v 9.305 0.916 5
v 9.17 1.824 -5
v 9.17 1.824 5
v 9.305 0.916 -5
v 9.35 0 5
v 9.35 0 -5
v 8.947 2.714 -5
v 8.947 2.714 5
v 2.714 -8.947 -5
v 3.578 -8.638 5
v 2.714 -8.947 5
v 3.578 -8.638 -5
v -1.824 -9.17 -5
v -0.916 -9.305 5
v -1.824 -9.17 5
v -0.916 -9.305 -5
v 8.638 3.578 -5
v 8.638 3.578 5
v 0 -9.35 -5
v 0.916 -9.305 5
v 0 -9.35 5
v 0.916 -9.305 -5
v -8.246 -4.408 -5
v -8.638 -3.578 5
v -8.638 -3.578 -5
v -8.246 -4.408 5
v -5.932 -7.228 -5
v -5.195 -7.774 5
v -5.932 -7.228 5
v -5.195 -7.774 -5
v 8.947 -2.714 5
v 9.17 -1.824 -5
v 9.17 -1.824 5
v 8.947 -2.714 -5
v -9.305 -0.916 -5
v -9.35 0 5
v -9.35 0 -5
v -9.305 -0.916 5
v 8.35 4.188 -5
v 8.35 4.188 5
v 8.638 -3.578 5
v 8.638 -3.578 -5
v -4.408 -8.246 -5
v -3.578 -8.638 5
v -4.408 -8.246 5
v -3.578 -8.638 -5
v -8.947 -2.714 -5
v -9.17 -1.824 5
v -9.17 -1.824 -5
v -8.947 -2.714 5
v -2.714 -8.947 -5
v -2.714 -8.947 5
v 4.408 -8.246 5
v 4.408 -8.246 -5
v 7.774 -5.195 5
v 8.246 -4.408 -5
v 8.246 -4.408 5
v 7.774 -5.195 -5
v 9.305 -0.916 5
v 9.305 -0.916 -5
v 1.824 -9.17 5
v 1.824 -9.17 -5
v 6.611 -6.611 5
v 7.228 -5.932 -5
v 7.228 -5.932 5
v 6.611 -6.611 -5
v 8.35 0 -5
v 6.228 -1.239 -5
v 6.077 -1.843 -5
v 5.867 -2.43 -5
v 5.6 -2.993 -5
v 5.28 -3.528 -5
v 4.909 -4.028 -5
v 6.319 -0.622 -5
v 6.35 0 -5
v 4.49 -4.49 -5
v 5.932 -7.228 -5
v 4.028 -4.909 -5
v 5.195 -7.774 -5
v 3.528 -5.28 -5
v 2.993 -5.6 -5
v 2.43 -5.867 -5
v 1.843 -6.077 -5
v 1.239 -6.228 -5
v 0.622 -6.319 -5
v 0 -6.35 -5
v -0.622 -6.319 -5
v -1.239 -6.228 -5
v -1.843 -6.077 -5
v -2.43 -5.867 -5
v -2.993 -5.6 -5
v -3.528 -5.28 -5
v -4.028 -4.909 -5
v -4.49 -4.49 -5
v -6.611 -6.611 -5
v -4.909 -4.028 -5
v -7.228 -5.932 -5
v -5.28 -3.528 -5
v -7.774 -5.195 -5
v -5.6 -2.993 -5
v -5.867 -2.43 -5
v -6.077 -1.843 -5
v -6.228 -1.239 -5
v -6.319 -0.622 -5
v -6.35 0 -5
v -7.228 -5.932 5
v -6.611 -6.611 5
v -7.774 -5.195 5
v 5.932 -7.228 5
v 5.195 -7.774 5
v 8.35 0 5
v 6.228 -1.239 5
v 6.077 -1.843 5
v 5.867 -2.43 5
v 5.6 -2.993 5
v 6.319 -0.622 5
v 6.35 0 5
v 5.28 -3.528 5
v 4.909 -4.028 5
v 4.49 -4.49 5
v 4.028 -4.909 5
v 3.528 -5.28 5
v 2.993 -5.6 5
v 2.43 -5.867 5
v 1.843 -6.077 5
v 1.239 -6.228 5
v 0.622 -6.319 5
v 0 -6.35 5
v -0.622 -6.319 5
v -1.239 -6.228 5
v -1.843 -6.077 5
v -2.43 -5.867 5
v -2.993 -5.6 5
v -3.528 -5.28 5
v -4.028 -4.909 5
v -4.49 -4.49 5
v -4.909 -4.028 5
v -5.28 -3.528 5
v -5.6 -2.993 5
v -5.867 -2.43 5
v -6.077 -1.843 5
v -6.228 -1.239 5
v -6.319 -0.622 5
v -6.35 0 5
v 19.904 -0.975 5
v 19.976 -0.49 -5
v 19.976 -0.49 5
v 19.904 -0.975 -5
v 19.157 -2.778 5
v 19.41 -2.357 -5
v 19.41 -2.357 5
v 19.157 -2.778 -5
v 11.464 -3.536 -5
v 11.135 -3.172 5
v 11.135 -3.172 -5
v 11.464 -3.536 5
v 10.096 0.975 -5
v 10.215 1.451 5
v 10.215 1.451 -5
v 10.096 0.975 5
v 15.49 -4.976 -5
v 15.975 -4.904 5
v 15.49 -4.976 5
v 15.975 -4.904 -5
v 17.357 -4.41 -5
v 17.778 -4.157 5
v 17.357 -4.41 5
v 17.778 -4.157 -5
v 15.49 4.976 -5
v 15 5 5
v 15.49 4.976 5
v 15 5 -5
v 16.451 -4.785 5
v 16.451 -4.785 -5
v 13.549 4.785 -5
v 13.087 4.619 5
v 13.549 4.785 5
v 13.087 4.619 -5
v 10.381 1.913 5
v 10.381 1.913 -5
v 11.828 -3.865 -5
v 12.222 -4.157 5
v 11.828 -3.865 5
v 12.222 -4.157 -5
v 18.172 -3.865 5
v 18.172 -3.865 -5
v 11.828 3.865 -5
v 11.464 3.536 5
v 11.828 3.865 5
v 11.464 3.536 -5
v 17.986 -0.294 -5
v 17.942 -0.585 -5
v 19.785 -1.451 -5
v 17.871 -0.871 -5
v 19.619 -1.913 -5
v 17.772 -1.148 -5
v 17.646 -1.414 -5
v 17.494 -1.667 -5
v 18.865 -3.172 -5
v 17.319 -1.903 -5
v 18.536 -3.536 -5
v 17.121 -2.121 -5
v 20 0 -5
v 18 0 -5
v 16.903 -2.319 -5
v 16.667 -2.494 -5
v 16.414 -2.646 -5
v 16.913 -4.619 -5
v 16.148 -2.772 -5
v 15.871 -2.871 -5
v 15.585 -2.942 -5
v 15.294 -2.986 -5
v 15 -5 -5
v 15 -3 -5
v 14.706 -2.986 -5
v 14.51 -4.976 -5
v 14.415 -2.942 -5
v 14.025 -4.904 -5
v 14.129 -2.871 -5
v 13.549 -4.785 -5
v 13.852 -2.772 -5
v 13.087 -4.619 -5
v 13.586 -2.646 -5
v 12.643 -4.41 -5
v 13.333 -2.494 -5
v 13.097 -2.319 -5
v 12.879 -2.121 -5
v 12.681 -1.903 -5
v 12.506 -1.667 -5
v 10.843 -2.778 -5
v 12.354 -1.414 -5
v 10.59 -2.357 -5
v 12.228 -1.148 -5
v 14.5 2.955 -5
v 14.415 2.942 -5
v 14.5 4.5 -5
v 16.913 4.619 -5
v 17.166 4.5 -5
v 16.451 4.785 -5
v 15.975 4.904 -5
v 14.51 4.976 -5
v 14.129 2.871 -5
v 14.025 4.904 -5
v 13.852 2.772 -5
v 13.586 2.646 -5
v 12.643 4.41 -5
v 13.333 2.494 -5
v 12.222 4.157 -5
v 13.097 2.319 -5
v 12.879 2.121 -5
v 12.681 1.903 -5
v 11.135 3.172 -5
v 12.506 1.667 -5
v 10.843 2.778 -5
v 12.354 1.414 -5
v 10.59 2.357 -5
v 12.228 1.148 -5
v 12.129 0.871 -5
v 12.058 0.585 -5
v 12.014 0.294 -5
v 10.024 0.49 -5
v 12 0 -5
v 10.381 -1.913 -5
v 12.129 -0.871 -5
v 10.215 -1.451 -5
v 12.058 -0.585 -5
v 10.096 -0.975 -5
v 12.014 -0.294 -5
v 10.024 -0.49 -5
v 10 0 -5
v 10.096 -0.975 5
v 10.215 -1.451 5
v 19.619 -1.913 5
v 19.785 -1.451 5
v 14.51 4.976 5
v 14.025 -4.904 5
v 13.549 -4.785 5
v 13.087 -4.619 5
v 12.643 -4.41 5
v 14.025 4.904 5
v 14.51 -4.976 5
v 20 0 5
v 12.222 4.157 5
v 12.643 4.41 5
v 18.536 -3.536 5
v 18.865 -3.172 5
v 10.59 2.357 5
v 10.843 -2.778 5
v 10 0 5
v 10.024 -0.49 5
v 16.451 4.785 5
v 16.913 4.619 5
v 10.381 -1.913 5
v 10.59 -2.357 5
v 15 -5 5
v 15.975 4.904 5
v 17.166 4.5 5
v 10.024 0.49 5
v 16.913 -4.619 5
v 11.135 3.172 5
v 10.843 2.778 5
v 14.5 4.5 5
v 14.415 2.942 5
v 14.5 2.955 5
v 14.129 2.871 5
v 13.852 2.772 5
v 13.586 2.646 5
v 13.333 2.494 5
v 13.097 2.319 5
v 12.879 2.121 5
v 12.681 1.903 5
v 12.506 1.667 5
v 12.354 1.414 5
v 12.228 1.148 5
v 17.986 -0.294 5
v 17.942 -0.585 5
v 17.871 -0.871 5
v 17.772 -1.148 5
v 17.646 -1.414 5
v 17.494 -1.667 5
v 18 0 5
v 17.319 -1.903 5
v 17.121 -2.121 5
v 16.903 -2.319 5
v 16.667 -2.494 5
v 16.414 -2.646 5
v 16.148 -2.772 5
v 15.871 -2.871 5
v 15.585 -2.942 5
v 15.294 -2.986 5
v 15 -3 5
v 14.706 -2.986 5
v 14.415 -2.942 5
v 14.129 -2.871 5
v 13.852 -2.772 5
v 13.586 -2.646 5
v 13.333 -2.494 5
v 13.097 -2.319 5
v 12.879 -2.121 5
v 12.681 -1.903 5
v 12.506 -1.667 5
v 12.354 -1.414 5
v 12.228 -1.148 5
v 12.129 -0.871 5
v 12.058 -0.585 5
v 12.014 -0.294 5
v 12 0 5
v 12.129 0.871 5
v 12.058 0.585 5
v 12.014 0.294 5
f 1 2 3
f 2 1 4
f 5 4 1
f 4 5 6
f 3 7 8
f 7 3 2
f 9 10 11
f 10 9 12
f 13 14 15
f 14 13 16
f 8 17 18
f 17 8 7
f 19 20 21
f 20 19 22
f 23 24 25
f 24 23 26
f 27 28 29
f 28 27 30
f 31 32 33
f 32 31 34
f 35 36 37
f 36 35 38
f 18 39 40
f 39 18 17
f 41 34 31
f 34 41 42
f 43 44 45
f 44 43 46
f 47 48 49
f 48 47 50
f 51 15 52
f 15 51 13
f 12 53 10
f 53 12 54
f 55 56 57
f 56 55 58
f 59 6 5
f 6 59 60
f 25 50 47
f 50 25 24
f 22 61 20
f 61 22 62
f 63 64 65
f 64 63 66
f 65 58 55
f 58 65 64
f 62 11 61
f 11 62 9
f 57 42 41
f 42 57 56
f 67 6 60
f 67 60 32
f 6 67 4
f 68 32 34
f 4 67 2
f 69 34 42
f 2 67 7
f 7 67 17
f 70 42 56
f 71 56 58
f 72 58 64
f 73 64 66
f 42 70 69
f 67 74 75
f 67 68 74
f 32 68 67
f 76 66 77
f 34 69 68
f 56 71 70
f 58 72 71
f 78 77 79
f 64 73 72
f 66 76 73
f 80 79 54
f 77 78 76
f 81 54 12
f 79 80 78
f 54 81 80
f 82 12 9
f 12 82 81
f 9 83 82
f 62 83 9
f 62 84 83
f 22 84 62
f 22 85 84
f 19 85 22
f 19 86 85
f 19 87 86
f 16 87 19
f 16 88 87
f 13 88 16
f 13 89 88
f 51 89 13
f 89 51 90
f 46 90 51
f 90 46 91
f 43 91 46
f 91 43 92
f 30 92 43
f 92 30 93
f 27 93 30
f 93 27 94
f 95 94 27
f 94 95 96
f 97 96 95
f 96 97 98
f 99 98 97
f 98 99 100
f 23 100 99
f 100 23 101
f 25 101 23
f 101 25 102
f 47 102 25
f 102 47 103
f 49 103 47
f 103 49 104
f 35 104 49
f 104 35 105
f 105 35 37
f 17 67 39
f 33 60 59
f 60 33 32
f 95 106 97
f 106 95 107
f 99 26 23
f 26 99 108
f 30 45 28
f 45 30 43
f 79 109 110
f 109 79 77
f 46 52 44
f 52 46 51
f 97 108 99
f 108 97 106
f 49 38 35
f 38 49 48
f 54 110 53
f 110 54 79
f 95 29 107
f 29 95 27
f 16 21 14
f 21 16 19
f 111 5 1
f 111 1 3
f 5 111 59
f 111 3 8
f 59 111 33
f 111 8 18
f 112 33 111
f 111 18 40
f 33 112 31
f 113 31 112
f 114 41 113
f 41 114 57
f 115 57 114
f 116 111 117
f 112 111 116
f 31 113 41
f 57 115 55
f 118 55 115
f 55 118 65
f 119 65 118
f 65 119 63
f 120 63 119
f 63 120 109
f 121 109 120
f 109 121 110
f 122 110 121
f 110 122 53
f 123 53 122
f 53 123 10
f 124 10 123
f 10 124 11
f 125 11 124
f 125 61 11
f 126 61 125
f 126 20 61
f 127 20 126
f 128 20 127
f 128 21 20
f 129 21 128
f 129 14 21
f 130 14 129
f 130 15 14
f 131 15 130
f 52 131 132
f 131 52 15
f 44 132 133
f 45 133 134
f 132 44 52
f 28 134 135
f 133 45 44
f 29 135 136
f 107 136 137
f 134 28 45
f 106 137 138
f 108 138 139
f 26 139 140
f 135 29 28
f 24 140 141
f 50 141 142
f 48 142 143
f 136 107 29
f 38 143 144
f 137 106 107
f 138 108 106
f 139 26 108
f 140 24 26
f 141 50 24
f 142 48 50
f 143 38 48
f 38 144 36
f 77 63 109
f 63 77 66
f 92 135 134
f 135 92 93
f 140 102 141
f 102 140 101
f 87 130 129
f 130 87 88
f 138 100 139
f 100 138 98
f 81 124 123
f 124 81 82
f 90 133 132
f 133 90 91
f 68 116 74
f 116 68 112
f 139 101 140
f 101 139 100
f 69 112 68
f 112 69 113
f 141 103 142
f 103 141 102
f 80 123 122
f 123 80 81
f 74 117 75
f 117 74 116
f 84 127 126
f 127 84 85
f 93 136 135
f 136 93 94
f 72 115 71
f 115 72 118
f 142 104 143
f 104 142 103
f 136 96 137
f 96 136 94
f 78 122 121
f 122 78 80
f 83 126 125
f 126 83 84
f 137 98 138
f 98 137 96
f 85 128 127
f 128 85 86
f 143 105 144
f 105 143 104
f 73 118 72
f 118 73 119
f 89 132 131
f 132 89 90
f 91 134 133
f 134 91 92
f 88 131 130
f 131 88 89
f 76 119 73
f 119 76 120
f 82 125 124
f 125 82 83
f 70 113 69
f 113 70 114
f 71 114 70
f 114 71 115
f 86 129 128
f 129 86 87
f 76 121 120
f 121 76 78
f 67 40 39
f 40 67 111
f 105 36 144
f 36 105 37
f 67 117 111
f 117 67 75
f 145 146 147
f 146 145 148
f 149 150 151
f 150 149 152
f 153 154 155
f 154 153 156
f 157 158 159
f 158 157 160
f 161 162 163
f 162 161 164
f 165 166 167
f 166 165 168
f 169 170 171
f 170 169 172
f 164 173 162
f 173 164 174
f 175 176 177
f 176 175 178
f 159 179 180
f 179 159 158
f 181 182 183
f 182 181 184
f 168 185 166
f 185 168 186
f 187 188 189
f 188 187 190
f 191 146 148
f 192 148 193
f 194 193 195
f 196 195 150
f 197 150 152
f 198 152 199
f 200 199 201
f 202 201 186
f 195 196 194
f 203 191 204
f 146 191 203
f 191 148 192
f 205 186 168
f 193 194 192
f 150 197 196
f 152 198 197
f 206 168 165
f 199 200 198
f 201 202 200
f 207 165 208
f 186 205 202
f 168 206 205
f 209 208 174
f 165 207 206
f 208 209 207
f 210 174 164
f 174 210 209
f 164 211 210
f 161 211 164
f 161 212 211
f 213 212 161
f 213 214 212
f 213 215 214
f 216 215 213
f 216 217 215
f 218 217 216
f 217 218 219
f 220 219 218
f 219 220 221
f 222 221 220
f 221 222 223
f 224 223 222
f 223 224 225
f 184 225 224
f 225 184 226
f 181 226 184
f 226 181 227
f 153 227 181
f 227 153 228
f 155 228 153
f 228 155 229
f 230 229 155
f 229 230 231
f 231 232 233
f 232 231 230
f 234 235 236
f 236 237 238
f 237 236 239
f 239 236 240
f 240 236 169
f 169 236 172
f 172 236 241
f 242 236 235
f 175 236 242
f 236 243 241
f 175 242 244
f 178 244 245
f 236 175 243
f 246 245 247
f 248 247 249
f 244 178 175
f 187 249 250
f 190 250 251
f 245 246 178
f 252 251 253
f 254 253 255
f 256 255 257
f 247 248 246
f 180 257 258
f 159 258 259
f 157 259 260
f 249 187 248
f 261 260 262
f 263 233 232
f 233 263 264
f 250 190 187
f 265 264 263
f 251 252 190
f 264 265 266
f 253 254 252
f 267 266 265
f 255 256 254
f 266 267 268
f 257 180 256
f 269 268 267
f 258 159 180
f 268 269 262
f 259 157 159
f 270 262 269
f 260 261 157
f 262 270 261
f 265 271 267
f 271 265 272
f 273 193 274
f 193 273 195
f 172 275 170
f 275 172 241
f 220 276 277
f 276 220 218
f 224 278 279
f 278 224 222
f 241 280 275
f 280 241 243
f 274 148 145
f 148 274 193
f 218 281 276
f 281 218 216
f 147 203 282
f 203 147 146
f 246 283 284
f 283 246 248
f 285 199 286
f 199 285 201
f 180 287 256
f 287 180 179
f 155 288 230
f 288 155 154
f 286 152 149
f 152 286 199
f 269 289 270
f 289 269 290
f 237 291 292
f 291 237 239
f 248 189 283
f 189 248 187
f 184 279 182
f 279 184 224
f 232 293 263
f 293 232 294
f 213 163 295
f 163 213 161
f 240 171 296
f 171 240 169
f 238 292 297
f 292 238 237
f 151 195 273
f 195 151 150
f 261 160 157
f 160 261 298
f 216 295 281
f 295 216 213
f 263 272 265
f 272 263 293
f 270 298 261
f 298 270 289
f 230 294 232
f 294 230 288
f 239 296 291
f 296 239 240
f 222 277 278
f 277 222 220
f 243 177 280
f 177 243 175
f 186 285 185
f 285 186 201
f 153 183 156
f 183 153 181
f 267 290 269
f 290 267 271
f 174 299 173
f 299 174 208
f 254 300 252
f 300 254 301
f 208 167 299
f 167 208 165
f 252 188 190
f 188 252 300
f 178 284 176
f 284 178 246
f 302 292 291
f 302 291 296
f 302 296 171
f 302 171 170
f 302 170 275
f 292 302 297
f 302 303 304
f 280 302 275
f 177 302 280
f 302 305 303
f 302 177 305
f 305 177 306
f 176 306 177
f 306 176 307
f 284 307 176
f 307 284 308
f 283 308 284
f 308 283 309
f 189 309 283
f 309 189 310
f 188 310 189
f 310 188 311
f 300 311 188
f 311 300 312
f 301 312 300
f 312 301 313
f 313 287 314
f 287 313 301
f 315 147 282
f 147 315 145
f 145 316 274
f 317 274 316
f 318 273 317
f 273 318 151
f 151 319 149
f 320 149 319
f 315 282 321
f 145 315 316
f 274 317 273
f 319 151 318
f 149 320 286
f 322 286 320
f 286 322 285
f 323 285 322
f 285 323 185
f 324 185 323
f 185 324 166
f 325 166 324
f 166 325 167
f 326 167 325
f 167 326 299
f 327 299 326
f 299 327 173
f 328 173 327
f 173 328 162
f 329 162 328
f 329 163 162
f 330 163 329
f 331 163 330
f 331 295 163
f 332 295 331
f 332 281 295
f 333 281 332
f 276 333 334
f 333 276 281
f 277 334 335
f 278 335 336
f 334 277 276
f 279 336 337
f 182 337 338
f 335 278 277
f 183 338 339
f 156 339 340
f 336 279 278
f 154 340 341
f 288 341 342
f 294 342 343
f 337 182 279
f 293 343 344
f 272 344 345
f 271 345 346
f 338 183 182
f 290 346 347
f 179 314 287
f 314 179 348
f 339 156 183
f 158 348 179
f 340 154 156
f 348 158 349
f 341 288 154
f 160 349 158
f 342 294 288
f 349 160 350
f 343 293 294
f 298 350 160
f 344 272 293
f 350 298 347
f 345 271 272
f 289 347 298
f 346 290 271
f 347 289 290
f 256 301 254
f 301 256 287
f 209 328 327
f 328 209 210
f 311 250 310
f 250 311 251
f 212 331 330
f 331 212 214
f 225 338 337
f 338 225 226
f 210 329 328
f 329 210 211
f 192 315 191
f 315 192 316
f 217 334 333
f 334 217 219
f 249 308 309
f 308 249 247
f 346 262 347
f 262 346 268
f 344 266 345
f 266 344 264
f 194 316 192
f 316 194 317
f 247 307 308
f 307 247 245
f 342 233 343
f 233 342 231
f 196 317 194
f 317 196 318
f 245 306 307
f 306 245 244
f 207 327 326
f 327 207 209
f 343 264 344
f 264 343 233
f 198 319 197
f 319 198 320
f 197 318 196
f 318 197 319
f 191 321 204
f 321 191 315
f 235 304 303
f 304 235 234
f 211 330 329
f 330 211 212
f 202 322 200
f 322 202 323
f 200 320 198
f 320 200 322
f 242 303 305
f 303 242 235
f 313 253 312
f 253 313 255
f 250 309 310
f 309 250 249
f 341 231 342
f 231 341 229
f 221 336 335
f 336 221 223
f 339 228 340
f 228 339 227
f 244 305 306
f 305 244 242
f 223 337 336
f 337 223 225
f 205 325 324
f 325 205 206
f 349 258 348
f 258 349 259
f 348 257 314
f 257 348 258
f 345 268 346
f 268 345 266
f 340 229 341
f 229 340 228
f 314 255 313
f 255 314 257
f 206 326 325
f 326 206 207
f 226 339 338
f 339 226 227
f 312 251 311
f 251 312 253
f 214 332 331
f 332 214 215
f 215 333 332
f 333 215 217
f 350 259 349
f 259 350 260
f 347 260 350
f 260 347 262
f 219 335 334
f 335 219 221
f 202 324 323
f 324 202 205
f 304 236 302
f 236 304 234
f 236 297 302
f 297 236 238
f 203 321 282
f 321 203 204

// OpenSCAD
// Snap-on clip for 12.7mm lab rod and 6mm tubing
// Designed for FDM printing: printed flat on the XY plane.

// --- Dimensions ---
rod_id      = 12.7;    // Inner diameter of the rod ring
rod_wall    = 3.0;     // Wall thickness of the rod ring
rod_od      = rod_id + 2 * rod_wall; // Outer diameter of the rod ring

rod_gap_w   = 10.0;    // Width of the opening in the rod ring
rod_gap_h   = 10.0;    // Height of the opening in the rod ring (covers -5 to 5)

tube_id     = 6.0;     // Inner diameter of the tubing ring
tube_wall   = 2.0;     // Wall thickness of the tubing ring
tube_od     = tube_id + 2 * tube_wall; // Outer diameter of the tubing ring

tube_gap_w  = 4.5;     // Width of the opening in the tubing ring
tube_gap_h  = 4.5;     // Height of the opening in the tubing ring (covers -2.25 to 2.25)

tube_offset_x = 15.0;  // X-coordinate of the tubing ring center
bridge_w_y    = 6.0;   // Width of the bridge in the Y direction
bridge_x_start = 8.0;   // Start of the bridge in X
bridge_x_end   = 12.0;  // End of the bridge in X

extrusion_z = 10.0;    // Total height of the part (Z)

$fn = 64;

// --- Geometry Construction ---

module rod_ring() {
    difference() {
        // Outer cylinder
        cylinder(h = extrusion_z, d = rod_od, center = true);
        // Inner hole
        cylinder(h = extrusion_z + 2, d = rod_id, center = true);
        // Snap gap (cut from -X side)
        // We use a cube to cut the gap. To ensure a clean cut, we make it slightly larger.
        translate([-rod_od/2 - 1, 0, -extrusion_z/2 - 1])
            cube([rod_od, rod_gap_w, extrusion_z + 2]);
    }
}

module tube_ring() {
    translate([tube_offset_x, 0, 0])
    difference() {
        // Outer cylinder
        cylinder(h = extrusion_z, d = tube_od, center = true);
        // Inner hole
        cylinder(h = extrusion_z + 2, d = tube_id, center = true);
        // Snap gap (cut from +X side)
        translate([tube_offset_x + tube_od/2 - tube_gap_w - 1, 0, -extrusion_z/2 - 1])
            cube([tube_gap_w + 2, tube_gap_h, extrusion_z + 2]);
    }
}

module bridge() {
    // The bridge is a solid block between the two rings.
    // It is centered on Y, so Y goes from -bridge_w_y/2 to bridge_w_y/2.
    translate([0, 0, -extrusion_z/2])
    cube([bridge_x_end - bridge_x_start, bridge_w_y, extrusion_z]);
}

// --- Final Assembly ---

// We use union for the main body and difference to ensure the gaps are clean.
// However, the prompt describes the profile as a union of three parts.
// To ensure the gaps are actually holes through the whole 10mm extrusion:

difference() {
    // The main body
    union() {
        rod_ring();
        tube_ring();
        bridge();
    }
    
    // Re-applying the gaps as subtractions to ensure they are through-holes
    // even if the union/difference logic gets complex with the bridge.
    
    // Rod gap subtraction
    translate([-rod_od/2 - 1, 0, -extrusion_z/2 - 1])
        cube([rod_od, rod_gap_w, extrusion_z + 2]);
        
    // Tube gap subtraction
    translate([tube_offset_x + tube_od/2 - tube_gap_w - 1, 0, -extrusion_z/2 - 1])
        cube([tube_gap_w + 2, tube_gap_h, extrusion_z + 2]);
}

// Note: The bridge is defined as a solid between x=8 and x=12. 
// Since the rod ring ends at x = -9.35 and tube ring starts at x = 14, 
// the bridge connects the two.
